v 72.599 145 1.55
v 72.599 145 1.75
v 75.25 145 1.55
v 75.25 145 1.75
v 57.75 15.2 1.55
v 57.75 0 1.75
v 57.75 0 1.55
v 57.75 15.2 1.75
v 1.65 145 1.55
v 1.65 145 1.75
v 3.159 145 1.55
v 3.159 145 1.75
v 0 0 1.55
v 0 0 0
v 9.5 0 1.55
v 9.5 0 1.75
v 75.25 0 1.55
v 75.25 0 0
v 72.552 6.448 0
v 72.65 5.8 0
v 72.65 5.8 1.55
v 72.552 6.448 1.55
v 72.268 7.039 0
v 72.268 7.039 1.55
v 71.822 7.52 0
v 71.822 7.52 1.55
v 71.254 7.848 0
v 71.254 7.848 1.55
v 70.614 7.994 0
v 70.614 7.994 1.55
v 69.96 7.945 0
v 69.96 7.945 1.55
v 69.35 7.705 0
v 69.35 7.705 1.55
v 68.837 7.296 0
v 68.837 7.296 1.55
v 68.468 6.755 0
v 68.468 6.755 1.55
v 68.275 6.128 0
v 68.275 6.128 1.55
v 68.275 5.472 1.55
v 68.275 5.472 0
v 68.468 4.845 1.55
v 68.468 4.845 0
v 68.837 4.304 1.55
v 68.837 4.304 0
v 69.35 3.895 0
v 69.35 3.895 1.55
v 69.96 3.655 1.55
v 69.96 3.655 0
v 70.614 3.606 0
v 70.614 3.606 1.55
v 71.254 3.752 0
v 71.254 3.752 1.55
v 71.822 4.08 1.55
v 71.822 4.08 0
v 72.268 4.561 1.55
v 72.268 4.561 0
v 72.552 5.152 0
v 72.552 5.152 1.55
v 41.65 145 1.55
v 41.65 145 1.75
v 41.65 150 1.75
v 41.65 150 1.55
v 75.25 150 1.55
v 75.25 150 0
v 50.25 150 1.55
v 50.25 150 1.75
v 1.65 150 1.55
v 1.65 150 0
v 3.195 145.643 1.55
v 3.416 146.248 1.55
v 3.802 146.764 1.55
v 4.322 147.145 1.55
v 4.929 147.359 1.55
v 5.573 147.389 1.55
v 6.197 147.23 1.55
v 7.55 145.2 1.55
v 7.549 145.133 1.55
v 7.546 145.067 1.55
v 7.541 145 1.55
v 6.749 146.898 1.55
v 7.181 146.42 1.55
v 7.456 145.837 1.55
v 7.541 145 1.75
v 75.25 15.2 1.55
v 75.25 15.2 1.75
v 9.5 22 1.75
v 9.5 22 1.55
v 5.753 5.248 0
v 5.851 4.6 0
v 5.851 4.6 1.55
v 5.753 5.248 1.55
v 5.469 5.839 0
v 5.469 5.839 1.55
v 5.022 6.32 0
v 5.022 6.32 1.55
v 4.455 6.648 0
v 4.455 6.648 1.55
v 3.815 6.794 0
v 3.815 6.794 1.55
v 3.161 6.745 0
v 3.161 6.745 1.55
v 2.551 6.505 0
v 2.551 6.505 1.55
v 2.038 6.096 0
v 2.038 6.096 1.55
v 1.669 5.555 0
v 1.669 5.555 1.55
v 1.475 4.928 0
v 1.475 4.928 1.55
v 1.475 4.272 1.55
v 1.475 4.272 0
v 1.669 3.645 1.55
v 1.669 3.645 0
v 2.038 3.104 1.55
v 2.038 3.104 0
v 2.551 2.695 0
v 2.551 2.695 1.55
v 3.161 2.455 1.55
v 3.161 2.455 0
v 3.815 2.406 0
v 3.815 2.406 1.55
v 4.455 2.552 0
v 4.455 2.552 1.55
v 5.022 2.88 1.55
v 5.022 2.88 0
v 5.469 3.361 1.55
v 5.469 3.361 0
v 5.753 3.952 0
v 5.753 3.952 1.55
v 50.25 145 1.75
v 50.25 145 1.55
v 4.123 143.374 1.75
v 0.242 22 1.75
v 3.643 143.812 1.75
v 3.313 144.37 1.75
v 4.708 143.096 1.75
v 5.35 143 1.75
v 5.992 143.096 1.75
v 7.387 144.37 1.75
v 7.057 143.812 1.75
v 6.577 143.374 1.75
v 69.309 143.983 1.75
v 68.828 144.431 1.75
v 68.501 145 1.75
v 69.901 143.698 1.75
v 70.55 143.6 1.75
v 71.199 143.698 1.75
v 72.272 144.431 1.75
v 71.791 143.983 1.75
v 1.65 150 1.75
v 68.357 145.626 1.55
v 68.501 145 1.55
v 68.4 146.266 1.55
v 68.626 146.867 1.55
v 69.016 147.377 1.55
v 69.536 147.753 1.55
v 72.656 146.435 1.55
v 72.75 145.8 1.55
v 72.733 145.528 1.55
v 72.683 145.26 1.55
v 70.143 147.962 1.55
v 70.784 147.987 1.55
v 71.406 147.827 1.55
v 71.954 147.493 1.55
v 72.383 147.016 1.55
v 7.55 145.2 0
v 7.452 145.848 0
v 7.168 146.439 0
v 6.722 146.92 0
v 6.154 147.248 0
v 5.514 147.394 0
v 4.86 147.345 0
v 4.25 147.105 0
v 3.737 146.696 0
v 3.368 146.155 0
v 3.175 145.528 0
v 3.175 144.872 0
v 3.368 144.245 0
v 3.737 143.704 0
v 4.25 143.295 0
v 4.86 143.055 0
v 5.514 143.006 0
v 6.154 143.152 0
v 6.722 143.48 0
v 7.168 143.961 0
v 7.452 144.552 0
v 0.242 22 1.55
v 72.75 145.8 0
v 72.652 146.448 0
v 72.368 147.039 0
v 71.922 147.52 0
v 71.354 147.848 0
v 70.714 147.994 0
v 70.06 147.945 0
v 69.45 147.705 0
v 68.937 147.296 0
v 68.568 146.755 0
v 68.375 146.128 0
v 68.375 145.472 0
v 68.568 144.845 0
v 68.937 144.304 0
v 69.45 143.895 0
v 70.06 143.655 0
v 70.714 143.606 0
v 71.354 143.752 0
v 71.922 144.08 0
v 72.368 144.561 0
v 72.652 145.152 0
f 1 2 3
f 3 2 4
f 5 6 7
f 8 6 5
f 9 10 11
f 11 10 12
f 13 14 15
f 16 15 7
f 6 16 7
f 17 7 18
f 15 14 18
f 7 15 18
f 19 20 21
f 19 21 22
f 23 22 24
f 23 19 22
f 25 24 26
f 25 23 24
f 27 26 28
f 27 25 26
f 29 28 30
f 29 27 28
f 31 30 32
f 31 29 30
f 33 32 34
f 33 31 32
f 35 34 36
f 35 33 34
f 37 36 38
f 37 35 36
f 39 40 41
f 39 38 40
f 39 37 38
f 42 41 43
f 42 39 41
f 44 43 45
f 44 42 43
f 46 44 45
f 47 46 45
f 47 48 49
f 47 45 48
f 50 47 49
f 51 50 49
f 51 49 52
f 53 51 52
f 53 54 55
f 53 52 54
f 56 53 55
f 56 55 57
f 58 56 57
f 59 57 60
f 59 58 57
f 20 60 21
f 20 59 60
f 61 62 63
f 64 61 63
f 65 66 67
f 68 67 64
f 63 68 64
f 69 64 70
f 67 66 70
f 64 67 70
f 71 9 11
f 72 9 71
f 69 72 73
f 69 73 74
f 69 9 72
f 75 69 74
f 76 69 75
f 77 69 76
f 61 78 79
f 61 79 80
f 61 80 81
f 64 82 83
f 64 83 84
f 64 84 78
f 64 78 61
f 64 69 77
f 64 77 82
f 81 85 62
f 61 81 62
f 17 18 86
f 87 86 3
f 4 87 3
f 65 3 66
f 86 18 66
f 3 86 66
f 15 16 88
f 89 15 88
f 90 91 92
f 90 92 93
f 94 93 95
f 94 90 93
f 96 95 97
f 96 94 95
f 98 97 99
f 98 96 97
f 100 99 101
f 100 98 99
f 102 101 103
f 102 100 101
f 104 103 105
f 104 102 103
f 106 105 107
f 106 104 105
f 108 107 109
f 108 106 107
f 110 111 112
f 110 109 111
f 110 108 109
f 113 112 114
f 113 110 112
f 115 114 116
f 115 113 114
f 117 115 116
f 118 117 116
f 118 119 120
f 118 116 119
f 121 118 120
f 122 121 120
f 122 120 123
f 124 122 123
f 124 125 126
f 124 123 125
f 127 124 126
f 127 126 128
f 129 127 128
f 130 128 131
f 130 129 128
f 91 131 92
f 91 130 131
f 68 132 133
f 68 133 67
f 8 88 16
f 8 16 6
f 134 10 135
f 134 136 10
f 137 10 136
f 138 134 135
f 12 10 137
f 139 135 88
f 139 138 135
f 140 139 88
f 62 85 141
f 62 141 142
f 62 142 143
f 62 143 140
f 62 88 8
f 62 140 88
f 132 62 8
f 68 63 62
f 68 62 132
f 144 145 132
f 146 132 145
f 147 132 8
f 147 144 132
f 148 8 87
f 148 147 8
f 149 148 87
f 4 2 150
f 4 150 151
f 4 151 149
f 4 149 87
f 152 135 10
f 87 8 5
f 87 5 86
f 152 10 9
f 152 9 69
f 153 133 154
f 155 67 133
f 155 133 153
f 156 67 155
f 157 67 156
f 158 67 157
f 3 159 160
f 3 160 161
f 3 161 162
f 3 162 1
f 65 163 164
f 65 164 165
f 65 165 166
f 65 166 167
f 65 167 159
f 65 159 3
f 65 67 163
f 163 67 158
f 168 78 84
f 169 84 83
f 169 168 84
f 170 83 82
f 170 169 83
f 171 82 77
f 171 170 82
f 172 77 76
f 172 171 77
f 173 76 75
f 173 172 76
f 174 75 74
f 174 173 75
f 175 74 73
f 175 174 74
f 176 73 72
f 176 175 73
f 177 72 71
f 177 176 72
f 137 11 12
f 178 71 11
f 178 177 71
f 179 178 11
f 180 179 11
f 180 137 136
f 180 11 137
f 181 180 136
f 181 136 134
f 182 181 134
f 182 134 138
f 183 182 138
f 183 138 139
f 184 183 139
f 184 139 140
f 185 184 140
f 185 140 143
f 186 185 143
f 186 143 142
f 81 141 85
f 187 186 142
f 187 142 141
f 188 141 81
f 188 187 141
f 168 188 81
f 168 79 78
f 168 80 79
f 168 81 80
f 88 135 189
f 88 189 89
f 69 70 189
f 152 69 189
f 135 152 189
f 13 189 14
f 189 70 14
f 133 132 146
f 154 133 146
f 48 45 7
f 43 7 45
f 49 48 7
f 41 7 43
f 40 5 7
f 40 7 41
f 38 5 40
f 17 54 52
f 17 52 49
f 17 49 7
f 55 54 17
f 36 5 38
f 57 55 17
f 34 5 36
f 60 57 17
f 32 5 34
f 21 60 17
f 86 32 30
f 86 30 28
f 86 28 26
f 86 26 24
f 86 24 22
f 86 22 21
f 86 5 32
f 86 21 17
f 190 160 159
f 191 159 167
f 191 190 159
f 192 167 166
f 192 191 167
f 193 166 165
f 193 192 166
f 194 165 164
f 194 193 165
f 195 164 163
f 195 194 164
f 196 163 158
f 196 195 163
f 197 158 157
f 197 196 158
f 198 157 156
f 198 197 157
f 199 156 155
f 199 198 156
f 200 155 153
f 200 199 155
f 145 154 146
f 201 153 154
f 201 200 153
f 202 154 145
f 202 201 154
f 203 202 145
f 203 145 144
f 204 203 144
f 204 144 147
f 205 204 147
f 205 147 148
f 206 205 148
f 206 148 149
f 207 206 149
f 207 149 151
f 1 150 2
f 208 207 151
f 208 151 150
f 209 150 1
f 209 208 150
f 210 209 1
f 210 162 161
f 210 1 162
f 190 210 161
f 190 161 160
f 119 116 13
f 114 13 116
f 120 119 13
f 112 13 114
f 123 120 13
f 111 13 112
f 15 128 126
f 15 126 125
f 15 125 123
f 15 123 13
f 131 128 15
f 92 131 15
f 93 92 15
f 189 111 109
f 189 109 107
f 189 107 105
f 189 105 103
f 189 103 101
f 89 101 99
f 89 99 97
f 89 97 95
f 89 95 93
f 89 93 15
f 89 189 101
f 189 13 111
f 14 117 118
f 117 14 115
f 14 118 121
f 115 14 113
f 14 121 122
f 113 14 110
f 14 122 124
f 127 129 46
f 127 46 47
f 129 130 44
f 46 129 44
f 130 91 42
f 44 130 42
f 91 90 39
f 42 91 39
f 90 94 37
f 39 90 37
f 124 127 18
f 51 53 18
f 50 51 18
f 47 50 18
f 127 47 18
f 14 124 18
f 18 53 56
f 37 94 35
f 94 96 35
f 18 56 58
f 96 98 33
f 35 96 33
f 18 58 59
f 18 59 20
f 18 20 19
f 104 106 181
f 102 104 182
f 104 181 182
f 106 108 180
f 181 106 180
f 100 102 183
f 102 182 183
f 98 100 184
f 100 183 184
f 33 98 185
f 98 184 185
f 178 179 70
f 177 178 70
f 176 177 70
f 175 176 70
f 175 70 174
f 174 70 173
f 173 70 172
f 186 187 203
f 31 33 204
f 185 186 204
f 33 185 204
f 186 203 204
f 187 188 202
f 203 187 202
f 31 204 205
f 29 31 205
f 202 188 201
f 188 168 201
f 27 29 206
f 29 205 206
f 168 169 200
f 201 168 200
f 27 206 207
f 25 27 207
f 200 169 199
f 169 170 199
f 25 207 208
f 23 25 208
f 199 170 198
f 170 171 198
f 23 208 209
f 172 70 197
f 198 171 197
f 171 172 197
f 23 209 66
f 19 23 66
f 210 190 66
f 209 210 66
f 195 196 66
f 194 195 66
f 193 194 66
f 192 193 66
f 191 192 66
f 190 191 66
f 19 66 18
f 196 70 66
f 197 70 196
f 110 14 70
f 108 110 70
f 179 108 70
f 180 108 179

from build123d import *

# Parameters (mm, degrees)
SALIENTE_EXTRUIR1_DEPTH    = 1.75
CROQUIS2_W                 = 17.5
CROQUIS2_H                 = 15.2
CROQUIS2_W_2               = 9.5
CROQUIS2_H_2               = 22
CROQUIS2_W_3               = 40
CROQUIS2_H_3               = 5
CROQUIS2_W_4               = 25
CORTAR_EXTRUIR1_DEPTH      = 0.2
CORTAR_EXTRUIR2_DEPTH      = 168.824208623
CORTAR_EXTRUIR2_DEPTH_BACK = 168.824208623
CROQUIS3_R                 = 2.2


with BuildPart() as part:
    # Croquis1 → Saliente-Extruir1 (new body)
    with BuildSketch(Plane.XY):
        Polygon((0, 0), (75.25, 0), (75.25, 150), (1.65, 150), align=None)
    extrude(amount=SALIENTE_EXTRUIR1_DEPTH)

    # Croquis2 → Cortar-Extruir1 (cut)
    with BuildSketch(Plane.XY.offset(1.75)):
        with Locations((66.5, 7.6)):
            Rectangle(CROQUIS2_W, CROQUIS2_H)
        with Locations((4.75, 11)):
            Rectangle(CROQUIS2_W_2, CROQUIS2_H_2)
        with Locations((21.65, 147.5)):
            Rectangle(CROQUIS2_W_3, CROQUIS2_H_3)
        with Locations((62.75, 147.5)):
            Rectangle(CROQUIS2_W_4, CROQUIS2_H_3)
    extrude(amount=-CORTAR_EXTRUIR1_DEPTH, mode=Mode.SUBTRACT)

    # Croquis3 → Cortar-Extruir2 (cut, two sides: drawn at the far end of the back side and taken through both)
    with BuildSketch(Plane.XY.offset(1.55).offset(-CORTAR_EXTRUIR2_DEPTH_BACK)):
        with Locations((3.650817793, 4.6)):
            Circle(CROQUIS3_R)
        with Locations((70.45, 5.8)):
            Circle(CROQUIS3_R)
        with Locations((5.35, 145.2)):
            Circle(CROQUIS3_R)
        with Locations((70.55, 145.8)):
            Circle(CROQUIS3_R)
    extrude(amount=CORTAR_EXTRUIR2_DEPTH + CORTAR_EXTRUIR2_DEPTH_BACK, mode=Mode.SUBTRACT)


solid = part.part
